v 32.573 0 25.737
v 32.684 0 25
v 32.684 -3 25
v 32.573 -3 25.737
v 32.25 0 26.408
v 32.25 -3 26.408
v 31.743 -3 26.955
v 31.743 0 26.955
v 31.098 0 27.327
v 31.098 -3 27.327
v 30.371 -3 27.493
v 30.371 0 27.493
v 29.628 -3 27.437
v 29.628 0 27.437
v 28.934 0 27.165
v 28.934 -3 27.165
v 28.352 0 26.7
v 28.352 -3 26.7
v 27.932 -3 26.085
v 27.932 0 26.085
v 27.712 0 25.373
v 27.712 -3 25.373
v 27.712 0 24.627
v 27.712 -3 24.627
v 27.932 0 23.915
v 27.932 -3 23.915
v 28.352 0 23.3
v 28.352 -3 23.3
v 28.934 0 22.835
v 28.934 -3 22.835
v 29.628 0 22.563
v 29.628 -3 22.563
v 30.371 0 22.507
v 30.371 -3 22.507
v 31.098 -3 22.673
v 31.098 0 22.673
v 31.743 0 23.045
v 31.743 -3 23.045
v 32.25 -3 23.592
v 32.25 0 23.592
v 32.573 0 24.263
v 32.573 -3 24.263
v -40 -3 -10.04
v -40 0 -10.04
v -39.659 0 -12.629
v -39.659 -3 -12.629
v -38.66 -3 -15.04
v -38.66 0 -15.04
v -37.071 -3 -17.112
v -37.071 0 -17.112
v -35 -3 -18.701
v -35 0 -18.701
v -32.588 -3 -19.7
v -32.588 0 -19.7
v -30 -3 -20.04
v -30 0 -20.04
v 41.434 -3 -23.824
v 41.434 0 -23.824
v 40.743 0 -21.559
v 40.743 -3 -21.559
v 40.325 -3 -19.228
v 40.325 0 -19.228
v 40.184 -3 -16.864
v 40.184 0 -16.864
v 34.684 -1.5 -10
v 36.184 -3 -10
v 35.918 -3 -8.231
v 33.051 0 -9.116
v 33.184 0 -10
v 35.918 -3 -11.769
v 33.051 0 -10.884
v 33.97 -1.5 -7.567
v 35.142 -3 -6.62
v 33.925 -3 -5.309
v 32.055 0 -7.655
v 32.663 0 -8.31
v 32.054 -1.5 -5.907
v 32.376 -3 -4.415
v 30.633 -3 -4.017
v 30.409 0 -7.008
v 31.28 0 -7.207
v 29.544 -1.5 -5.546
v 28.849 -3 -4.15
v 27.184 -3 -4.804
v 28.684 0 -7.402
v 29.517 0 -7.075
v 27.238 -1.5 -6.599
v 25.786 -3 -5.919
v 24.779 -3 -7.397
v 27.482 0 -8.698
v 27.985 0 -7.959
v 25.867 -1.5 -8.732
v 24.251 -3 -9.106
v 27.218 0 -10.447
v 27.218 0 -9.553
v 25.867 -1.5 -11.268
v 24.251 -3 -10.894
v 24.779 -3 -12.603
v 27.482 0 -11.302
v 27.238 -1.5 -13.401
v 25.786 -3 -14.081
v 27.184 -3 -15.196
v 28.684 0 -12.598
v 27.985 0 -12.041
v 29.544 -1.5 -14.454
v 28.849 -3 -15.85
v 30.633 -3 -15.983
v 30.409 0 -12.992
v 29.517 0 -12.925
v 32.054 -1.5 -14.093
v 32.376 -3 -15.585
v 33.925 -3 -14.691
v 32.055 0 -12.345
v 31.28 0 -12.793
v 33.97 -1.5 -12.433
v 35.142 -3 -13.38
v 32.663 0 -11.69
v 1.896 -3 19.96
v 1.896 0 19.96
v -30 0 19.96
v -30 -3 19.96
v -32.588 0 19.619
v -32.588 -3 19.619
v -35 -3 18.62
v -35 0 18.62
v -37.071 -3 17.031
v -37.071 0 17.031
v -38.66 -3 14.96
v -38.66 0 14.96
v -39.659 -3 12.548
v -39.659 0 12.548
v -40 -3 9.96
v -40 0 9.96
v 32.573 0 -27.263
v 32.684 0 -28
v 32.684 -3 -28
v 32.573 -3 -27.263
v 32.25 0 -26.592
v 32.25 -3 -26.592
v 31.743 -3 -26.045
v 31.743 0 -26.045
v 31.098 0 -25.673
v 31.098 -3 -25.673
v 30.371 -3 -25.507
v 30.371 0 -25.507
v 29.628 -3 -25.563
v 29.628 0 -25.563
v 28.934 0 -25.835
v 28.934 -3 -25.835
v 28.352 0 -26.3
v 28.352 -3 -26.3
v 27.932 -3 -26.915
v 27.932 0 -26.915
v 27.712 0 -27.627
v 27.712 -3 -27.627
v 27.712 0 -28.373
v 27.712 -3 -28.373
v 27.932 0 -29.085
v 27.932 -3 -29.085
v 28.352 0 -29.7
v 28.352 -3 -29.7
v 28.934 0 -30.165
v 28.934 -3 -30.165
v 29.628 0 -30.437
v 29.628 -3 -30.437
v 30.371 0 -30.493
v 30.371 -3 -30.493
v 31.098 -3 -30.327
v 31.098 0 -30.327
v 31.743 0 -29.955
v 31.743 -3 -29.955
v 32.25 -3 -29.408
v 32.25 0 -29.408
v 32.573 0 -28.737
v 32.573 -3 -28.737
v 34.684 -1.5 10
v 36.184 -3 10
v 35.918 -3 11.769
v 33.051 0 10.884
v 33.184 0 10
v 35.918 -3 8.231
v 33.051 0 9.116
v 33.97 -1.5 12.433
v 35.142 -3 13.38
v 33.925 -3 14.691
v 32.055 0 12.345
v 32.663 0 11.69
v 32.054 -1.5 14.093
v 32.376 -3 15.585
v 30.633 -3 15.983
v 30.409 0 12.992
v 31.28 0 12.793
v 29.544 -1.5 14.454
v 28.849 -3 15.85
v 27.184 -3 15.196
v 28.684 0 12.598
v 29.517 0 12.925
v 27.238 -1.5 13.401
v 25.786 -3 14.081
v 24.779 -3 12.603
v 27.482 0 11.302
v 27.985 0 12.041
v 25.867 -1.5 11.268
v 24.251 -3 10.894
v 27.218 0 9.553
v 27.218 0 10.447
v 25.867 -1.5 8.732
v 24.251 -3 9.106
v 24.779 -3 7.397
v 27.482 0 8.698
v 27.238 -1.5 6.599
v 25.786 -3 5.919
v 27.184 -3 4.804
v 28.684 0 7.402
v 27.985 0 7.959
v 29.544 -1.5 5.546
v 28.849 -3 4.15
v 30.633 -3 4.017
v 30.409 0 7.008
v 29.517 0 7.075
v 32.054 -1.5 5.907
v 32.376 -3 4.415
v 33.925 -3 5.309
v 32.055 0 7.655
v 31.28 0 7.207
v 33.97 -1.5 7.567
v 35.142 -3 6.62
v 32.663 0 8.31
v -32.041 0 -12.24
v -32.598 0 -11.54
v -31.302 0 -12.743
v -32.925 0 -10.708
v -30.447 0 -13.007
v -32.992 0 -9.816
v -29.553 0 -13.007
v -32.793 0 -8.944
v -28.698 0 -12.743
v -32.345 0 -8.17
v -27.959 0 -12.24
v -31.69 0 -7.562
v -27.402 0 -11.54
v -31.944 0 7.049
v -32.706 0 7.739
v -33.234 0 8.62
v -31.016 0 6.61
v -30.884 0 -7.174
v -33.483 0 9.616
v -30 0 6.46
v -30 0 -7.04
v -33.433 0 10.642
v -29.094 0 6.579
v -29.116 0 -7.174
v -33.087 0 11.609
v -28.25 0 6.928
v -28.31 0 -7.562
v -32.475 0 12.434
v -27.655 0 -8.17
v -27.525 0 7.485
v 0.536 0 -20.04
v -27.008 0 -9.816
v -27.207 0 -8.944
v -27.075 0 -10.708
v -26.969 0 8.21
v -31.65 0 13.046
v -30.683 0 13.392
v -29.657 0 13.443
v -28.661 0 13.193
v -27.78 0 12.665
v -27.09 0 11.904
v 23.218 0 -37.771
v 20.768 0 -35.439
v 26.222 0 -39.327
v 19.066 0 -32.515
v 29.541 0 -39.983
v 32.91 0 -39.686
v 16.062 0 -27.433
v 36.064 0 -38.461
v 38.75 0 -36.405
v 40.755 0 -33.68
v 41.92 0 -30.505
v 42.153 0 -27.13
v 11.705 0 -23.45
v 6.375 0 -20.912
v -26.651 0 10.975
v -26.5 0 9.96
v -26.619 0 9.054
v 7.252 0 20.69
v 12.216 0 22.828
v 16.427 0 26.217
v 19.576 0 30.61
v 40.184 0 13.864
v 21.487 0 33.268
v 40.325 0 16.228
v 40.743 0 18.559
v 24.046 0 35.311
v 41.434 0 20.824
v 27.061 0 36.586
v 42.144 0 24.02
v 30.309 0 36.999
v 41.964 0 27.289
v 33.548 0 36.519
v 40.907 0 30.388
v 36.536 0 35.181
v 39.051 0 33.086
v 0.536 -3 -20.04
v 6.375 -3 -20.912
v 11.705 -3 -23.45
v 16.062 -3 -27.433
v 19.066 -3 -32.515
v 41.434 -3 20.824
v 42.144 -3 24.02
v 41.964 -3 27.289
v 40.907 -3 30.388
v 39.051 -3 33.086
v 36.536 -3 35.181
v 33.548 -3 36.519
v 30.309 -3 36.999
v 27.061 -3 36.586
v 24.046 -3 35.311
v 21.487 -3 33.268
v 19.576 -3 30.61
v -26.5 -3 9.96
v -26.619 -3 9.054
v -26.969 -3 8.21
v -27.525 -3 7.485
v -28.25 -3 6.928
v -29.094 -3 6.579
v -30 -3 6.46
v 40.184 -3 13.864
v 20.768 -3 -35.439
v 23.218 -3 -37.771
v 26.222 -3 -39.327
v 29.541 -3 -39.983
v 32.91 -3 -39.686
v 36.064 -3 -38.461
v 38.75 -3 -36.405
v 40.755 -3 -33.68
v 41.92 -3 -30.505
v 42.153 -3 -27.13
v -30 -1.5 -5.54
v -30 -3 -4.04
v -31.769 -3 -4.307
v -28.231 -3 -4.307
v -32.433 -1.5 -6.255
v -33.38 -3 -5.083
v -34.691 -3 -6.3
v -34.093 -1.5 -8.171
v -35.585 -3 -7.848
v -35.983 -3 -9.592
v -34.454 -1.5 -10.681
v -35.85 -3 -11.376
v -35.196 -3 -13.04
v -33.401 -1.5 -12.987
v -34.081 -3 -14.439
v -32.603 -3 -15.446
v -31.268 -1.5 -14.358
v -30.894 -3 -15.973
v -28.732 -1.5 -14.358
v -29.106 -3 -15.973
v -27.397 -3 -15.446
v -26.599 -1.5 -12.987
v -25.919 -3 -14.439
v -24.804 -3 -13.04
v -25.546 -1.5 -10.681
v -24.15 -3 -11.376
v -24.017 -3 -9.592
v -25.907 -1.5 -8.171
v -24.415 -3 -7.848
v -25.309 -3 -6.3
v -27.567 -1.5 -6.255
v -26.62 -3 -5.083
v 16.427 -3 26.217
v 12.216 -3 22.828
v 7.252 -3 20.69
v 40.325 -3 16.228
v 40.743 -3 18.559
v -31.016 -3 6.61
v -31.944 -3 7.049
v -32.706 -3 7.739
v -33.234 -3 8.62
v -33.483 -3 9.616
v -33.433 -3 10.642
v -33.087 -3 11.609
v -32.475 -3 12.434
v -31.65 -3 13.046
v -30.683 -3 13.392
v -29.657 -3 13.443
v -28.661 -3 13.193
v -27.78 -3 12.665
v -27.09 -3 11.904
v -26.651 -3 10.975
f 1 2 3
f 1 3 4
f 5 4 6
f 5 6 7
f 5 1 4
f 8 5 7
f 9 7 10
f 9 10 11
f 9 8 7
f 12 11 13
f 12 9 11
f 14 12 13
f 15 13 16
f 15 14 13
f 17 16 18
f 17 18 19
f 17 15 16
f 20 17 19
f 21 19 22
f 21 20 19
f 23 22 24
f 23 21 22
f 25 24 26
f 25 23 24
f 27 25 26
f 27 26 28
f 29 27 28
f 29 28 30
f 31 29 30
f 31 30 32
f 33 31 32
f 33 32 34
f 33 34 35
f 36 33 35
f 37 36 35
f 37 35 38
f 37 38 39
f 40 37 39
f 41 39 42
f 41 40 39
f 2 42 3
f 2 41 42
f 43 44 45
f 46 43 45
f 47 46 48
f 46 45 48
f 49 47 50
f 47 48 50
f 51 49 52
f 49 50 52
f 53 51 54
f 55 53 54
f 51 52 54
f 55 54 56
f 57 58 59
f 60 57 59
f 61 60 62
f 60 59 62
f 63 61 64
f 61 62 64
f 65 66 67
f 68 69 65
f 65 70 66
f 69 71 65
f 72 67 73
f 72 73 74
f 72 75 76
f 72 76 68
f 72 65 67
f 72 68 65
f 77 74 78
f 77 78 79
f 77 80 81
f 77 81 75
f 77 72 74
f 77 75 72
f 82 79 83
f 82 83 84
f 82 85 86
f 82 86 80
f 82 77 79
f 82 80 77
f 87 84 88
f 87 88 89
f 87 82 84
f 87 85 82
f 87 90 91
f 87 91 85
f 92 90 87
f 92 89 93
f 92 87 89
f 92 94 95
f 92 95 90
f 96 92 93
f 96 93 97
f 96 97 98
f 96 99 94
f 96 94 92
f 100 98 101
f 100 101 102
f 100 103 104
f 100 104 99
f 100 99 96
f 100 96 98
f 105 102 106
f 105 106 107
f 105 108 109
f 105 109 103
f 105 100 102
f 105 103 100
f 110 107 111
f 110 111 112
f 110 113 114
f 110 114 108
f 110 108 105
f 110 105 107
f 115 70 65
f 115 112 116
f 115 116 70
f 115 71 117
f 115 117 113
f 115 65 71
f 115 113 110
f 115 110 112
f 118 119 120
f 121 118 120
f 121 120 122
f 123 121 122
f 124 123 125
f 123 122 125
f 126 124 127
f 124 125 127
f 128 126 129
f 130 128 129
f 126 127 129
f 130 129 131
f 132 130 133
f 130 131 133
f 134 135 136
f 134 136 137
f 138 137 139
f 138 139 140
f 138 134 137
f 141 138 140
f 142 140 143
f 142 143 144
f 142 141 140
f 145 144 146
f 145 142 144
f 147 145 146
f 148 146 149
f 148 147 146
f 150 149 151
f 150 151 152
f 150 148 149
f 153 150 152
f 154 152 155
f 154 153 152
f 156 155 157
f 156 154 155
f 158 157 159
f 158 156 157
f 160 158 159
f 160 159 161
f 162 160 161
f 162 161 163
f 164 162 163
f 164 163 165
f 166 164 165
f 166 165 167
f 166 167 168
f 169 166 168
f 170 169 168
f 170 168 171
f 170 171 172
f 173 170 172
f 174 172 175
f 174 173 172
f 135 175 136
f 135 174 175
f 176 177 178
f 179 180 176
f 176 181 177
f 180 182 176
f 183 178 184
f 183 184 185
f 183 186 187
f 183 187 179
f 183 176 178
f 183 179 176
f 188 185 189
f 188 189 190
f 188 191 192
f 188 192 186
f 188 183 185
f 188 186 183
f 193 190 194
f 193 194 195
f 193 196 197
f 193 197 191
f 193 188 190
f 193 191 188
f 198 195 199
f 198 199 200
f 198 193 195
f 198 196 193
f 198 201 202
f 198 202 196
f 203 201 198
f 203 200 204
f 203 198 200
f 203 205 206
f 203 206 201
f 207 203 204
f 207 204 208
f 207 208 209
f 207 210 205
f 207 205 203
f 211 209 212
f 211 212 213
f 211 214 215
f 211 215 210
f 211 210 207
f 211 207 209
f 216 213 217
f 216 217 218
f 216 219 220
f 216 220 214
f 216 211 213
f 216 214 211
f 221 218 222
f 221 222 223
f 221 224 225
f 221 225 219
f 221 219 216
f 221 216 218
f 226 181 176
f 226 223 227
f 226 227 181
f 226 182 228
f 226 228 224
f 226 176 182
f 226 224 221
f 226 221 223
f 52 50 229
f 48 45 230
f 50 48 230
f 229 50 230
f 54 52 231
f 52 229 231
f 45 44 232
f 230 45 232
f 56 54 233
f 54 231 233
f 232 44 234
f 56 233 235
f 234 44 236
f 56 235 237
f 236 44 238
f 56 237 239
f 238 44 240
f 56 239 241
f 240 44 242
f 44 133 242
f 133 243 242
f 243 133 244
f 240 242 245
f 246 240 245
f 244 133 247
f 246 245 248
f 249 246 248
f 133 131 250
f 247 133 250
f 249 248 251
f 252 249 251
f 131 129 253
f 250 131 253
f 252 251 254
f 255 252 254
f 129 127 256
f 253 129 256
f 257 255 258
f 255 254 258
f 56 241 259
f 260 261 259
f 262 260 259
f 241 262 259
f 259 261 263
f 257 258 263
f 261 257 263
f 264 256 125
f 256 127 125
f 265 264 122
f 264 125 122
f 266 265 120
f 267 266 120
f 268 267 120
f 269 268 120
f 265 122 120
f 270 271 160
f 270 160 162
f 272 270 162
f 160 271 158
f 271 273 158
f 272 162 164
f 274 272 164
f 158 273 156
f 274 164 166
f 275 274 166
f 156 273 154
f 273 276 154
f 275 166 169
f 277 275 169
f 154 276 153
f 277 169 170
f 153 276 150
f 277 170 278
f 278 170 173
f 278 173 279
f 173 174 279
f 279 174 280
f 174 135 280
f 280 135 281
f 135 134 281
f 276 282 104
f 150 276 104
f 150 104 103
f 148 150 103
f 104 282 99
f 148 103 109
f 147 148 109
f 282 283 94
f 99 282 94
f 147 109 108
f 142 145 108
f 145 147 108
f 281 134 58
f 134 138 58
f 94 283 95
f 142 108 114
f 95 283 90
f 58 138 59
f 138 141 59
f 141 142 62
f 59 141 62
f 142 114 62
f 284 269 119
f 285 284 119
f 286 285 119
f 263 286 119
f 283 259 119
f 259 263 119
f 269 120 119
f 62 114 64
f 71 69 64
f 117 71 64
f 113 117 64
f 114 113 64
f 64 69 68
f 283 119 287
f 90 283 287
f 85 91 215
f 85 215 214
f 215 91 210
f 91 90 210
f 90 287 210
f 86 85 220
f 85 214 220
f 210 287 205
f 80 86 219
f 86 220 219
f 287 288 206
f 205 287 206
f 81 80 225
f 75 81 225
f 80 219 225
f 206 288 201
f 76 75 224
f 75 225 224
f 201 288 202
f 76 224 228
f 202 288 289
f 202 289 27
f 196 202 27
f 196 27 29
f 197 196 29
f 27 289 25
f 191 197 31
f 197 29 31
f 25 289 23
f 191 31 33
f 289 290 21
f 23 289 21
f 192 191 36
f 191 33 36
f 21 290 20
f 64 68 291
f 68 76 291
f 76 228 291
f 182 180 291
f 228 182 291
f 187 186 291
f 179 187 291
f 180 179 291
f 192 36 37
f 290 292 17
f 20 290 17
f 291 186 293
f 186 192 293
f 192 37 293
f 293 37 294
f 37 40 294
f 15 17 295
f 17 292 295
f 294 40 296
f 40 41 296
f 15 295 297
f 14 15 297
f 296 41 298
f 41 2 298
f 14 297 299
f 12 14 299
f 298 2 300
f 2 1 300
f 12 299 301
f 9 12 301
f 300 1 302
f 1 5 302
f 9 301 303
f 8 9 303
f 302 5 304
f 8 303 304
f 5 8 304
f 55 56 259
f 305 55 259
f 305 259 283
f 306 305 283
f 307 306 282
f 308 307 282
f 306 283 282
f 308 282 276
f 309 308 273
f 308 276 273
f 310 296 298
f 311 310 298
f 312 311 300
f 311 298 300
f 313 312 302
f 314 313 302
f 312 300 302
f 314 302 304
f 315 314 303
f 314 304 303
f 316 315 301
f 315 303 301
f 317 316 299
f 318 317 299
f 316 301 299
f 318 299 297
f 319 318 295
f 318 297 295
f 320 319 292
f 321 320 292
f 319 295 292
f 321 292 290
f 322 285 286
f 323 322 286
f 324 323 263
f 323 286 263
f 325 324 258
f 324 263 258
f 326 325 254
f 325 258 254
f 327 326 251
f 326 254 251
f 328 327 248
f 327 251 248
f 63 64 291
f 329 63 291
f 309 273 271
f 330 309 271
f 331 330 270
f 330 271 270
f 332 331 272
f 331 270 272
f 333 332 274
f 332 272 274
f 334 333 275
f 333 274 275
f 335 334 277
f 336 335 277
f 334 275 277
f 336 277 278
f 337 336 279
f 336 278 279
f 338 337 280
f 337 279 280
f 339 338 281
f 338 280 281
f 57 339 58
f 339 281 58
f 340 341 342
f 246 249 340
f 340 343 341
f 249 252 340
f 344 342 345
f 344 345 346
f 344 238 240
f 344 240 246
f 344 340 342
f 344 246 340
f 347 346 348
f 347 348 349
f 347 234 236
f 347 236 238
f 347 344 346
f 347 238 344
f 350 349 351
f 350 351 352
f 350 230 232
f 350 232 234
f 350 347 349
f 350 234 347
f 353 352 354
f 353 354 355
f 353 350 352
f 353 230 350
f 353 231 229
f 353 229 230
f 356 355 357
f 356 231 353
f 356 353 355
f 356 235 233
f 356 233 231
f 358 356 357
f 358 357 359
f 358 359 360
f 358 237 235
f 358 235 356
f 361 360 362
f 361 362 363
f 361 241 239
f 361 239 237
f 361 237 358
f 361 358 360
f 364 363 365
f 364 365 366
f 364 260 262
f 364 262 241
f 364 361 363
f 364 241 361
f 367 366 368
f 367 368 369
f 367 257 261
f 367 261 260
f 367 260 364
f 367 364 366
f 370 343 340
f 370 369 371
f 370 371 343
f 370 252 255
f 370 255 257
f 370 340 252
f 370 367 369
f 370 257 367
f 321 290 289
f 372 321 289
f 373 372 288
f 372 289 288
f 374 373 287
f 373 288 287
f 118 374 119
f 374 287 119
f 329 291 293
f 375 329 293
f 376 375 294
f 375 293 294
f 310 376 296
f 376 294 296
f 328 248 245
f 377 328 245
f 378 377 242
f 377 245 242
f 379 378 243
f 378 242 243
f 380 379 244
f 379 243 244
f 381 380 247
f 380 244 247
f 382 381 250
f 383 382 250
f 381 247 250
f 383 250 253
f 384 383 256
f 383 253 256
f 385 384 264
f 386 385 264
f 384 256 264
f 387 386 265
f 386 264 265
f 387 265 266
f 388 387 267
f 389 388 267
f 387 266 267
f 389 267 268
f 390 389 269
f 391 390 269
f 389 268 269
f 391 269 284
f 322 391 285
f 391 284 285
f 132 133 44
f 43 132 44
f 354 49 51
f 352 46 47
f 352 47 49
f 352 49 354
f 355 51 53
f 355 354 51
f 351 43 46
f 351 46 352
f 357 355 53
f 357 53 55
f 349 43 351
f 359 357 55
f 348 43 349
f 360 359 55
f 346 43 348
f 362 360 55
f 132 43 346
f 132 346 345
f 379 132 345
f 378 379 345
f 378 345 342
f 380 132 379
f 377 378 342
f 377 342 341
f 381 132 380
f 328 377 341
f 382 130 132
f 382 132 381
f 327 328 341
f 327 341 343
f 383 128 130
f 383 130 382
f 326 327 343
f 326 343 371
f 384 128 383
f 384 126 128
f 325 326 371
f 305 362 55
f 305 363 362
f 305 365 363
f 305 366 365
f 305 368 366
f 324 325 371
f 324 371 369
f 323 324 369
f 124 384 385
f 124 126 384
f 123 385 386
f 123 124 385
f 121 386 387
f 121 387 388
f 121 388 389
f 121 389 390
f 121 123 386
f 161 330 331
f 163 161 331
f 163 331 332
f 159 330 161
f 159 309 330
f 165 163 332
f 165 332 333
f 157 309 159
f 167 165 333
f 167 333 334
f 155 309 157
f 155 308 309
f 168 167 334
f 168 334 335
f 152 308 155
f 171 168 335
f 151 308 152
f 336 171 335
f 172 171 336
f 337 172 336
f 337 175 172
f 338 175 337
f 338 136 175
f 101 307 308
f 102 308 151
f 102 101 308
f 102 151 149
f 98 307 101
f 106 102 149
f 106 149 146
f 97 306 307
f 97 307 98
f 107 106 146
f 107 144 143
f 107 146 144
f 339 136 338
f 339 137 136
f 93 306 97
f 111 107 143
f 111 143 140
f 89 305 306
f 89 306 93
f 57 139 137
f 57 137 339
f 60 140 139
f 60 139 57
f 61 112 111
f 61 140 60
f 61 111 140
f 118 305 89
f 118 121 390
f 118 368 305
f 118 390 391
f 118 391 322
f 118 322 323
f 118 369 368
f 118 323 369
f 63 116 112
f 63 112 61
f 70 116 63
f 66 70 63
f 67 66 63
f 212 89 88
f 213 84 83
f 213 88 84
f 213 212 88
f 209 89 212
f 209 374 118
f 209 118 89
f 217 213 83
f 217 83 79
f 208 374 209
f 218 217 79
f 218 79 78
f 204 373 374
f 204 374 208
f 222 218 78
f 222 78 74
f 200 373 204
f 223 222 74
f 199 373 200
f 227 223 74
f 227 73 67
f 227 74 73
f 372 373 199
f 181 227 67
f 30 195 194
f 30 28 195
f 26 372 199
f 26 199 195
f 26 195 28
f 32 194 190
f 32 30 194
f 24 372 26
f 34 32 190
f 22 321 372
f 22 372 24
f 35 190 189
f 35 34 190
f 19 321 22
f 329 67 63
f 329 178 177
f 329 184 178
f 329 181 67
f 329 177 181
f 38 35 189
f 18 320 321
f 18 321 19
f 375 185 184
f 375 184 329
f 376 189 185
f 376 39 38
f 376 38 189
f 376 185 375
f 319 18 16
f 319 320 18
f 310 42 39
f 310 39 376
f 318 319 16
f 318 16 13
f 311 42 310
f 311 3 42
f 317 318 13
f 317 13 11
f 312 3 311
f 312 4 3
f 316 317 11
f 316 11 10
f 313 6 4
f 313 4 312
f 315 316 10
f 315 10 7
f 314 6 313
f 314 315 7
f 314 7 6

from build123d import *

# Parameters (mm, degrees)
F0_R     = 2.5
F1_DEPTH = 3


# Not quite as in the source:
# - a fillet or chamfer that OpenCascade refuses, or shapes differently, is made with other operations: its cross-section is extruded or revolved along the edge and cut away or added


with BuildPart() as f1:
    # F0 (on Front) → F1 (new body)
    with BuildSketch(Plane.XZ):
        with BuildLine():
            Line((40.1844298095, -16.8644712743), (40.1844298095, 13.8644712743))
            ThreePointArc((40.1844298095, 13.8644712743), (40.4994101244, 17.4000051803), (41.4344298095, 20.8241767279))
            ThreePointArc((41.4344298095, 20.8241767279), (35.0877662109, 35.9525016382), (19.5764143341, 30.6098135152))
            ThreePointArc((19.5764143341, 30.6098135152), (12.2164228481, 22.827751719), (1.8963885419, 19.9595027072))
            Line((1.8963885419, 19.9595027072), (-30, 19.9595027072))
            ThreePointArc((-30, 19.9595027072), (-37.0710678119, 17.030570519), (-40, 9.9595027072))
            Line((-40, 9.9595027072), (-40, -10.0404972928))
            ThreePointArc((-40, -10.0404972928), (-37.0710678119, -17.1115651047), (-30, -20.0404972928))
            Line((-30, -20.0404972928), (0.5360500065, -20.0404972928))
            ThreePointArc((0.5360500065, -20.0404972928), (11.7050648207, -23.4497436005), (19.0662873833, -32.5151864848))
            ThreePointArc((19.0662873833, -32.5151864848), (34.5304347857, -39.18535832), (41.4344298095, -23.8241767279))
            ThreePointArc((41.4344298095, -23.8241767279), (40.4994101244, -20.4000051803), (40.1844298095, -16.8644712743))
        make_face()
        with BuildLine():
            ThreePointArc((-30, -7.5404972928), (-28.232233047, -8.2727303399), (-27.5, -10.0404972928))
            ThreePointArc((-27.5, -10.0404972928), (-31.767766953, -11.8082642458), (-30, -7.5404972928))
        make_face(mode=Mode.SUBTRACT)
        with Locations((30.1844298095, -28)):
            Circle(F0_R, mode=Mode.SUBTRACT)
        with Locations((30.1844298095, -10)):
            Circle(F0_R, mode=Mode.SUBTRACT)
        with BuildLine():
            ThreePointArc((-26.5, 9.9595027072), (-27.5251262658, 7.484628973), (-30, 6.4595027072))
            ThreePointArc((-30, 6.4595027072), (-32.4748737342, 12.4343764413), (-26.5, 9.9595027072))
        make_face(mode=Mode.SUBTRACT)
        with Locations((30.1844298095, 10)):
            Circle(F0_R, mode=Mode.SUBTRACT)
        with Locations((30.1844298095, 25)):
            Circle(F0_R, mode=Mode.SUBTRACT)
    extrude(amount=F1_DEPTH)

    # F2: chamfer of 3.5 on 3 edges, made by hand

    # F2_s1 → F2_t2 (revolve, cut)
    with BuildSketch(Plane.YZ.offset(-30)):
        Polygon((-3, -4.0404972928), (0.5, -7.5404972928), (-3, -7.5404972928), align=None)
    revolve(axis=Axis((-30, -3, -10.0404972928), (0, -1, 0)), mode=Mode.SUBTRACT)

    # F2_s3 → F2_t4 (revolve, cut)
    with BuildSketch(Plane.XY.offset(-10)):
        Polygon((36.1844298095, -3), (32.6844298095, 0.5), (32.6844298095, -3), align=None)
    revolve(axis=Axis((30.1844298095, -3, -10), (0, -1, 0)), mode=Mode.SUBTRACT)

    # F2_s5 → F2_t6 (revolve, cut)
    with BuildSketch(Plane.XY.offset(10)):
        Polygon((36.1844298095, -3), (32.6844298095, 0.5), (32.6844298095, -3), align=None)
    revolve(axis=Axis((30.1844298095, -3, 10), (0, -1, 0)), mode=Mode.SUBTRACT)


solid = f1.part
